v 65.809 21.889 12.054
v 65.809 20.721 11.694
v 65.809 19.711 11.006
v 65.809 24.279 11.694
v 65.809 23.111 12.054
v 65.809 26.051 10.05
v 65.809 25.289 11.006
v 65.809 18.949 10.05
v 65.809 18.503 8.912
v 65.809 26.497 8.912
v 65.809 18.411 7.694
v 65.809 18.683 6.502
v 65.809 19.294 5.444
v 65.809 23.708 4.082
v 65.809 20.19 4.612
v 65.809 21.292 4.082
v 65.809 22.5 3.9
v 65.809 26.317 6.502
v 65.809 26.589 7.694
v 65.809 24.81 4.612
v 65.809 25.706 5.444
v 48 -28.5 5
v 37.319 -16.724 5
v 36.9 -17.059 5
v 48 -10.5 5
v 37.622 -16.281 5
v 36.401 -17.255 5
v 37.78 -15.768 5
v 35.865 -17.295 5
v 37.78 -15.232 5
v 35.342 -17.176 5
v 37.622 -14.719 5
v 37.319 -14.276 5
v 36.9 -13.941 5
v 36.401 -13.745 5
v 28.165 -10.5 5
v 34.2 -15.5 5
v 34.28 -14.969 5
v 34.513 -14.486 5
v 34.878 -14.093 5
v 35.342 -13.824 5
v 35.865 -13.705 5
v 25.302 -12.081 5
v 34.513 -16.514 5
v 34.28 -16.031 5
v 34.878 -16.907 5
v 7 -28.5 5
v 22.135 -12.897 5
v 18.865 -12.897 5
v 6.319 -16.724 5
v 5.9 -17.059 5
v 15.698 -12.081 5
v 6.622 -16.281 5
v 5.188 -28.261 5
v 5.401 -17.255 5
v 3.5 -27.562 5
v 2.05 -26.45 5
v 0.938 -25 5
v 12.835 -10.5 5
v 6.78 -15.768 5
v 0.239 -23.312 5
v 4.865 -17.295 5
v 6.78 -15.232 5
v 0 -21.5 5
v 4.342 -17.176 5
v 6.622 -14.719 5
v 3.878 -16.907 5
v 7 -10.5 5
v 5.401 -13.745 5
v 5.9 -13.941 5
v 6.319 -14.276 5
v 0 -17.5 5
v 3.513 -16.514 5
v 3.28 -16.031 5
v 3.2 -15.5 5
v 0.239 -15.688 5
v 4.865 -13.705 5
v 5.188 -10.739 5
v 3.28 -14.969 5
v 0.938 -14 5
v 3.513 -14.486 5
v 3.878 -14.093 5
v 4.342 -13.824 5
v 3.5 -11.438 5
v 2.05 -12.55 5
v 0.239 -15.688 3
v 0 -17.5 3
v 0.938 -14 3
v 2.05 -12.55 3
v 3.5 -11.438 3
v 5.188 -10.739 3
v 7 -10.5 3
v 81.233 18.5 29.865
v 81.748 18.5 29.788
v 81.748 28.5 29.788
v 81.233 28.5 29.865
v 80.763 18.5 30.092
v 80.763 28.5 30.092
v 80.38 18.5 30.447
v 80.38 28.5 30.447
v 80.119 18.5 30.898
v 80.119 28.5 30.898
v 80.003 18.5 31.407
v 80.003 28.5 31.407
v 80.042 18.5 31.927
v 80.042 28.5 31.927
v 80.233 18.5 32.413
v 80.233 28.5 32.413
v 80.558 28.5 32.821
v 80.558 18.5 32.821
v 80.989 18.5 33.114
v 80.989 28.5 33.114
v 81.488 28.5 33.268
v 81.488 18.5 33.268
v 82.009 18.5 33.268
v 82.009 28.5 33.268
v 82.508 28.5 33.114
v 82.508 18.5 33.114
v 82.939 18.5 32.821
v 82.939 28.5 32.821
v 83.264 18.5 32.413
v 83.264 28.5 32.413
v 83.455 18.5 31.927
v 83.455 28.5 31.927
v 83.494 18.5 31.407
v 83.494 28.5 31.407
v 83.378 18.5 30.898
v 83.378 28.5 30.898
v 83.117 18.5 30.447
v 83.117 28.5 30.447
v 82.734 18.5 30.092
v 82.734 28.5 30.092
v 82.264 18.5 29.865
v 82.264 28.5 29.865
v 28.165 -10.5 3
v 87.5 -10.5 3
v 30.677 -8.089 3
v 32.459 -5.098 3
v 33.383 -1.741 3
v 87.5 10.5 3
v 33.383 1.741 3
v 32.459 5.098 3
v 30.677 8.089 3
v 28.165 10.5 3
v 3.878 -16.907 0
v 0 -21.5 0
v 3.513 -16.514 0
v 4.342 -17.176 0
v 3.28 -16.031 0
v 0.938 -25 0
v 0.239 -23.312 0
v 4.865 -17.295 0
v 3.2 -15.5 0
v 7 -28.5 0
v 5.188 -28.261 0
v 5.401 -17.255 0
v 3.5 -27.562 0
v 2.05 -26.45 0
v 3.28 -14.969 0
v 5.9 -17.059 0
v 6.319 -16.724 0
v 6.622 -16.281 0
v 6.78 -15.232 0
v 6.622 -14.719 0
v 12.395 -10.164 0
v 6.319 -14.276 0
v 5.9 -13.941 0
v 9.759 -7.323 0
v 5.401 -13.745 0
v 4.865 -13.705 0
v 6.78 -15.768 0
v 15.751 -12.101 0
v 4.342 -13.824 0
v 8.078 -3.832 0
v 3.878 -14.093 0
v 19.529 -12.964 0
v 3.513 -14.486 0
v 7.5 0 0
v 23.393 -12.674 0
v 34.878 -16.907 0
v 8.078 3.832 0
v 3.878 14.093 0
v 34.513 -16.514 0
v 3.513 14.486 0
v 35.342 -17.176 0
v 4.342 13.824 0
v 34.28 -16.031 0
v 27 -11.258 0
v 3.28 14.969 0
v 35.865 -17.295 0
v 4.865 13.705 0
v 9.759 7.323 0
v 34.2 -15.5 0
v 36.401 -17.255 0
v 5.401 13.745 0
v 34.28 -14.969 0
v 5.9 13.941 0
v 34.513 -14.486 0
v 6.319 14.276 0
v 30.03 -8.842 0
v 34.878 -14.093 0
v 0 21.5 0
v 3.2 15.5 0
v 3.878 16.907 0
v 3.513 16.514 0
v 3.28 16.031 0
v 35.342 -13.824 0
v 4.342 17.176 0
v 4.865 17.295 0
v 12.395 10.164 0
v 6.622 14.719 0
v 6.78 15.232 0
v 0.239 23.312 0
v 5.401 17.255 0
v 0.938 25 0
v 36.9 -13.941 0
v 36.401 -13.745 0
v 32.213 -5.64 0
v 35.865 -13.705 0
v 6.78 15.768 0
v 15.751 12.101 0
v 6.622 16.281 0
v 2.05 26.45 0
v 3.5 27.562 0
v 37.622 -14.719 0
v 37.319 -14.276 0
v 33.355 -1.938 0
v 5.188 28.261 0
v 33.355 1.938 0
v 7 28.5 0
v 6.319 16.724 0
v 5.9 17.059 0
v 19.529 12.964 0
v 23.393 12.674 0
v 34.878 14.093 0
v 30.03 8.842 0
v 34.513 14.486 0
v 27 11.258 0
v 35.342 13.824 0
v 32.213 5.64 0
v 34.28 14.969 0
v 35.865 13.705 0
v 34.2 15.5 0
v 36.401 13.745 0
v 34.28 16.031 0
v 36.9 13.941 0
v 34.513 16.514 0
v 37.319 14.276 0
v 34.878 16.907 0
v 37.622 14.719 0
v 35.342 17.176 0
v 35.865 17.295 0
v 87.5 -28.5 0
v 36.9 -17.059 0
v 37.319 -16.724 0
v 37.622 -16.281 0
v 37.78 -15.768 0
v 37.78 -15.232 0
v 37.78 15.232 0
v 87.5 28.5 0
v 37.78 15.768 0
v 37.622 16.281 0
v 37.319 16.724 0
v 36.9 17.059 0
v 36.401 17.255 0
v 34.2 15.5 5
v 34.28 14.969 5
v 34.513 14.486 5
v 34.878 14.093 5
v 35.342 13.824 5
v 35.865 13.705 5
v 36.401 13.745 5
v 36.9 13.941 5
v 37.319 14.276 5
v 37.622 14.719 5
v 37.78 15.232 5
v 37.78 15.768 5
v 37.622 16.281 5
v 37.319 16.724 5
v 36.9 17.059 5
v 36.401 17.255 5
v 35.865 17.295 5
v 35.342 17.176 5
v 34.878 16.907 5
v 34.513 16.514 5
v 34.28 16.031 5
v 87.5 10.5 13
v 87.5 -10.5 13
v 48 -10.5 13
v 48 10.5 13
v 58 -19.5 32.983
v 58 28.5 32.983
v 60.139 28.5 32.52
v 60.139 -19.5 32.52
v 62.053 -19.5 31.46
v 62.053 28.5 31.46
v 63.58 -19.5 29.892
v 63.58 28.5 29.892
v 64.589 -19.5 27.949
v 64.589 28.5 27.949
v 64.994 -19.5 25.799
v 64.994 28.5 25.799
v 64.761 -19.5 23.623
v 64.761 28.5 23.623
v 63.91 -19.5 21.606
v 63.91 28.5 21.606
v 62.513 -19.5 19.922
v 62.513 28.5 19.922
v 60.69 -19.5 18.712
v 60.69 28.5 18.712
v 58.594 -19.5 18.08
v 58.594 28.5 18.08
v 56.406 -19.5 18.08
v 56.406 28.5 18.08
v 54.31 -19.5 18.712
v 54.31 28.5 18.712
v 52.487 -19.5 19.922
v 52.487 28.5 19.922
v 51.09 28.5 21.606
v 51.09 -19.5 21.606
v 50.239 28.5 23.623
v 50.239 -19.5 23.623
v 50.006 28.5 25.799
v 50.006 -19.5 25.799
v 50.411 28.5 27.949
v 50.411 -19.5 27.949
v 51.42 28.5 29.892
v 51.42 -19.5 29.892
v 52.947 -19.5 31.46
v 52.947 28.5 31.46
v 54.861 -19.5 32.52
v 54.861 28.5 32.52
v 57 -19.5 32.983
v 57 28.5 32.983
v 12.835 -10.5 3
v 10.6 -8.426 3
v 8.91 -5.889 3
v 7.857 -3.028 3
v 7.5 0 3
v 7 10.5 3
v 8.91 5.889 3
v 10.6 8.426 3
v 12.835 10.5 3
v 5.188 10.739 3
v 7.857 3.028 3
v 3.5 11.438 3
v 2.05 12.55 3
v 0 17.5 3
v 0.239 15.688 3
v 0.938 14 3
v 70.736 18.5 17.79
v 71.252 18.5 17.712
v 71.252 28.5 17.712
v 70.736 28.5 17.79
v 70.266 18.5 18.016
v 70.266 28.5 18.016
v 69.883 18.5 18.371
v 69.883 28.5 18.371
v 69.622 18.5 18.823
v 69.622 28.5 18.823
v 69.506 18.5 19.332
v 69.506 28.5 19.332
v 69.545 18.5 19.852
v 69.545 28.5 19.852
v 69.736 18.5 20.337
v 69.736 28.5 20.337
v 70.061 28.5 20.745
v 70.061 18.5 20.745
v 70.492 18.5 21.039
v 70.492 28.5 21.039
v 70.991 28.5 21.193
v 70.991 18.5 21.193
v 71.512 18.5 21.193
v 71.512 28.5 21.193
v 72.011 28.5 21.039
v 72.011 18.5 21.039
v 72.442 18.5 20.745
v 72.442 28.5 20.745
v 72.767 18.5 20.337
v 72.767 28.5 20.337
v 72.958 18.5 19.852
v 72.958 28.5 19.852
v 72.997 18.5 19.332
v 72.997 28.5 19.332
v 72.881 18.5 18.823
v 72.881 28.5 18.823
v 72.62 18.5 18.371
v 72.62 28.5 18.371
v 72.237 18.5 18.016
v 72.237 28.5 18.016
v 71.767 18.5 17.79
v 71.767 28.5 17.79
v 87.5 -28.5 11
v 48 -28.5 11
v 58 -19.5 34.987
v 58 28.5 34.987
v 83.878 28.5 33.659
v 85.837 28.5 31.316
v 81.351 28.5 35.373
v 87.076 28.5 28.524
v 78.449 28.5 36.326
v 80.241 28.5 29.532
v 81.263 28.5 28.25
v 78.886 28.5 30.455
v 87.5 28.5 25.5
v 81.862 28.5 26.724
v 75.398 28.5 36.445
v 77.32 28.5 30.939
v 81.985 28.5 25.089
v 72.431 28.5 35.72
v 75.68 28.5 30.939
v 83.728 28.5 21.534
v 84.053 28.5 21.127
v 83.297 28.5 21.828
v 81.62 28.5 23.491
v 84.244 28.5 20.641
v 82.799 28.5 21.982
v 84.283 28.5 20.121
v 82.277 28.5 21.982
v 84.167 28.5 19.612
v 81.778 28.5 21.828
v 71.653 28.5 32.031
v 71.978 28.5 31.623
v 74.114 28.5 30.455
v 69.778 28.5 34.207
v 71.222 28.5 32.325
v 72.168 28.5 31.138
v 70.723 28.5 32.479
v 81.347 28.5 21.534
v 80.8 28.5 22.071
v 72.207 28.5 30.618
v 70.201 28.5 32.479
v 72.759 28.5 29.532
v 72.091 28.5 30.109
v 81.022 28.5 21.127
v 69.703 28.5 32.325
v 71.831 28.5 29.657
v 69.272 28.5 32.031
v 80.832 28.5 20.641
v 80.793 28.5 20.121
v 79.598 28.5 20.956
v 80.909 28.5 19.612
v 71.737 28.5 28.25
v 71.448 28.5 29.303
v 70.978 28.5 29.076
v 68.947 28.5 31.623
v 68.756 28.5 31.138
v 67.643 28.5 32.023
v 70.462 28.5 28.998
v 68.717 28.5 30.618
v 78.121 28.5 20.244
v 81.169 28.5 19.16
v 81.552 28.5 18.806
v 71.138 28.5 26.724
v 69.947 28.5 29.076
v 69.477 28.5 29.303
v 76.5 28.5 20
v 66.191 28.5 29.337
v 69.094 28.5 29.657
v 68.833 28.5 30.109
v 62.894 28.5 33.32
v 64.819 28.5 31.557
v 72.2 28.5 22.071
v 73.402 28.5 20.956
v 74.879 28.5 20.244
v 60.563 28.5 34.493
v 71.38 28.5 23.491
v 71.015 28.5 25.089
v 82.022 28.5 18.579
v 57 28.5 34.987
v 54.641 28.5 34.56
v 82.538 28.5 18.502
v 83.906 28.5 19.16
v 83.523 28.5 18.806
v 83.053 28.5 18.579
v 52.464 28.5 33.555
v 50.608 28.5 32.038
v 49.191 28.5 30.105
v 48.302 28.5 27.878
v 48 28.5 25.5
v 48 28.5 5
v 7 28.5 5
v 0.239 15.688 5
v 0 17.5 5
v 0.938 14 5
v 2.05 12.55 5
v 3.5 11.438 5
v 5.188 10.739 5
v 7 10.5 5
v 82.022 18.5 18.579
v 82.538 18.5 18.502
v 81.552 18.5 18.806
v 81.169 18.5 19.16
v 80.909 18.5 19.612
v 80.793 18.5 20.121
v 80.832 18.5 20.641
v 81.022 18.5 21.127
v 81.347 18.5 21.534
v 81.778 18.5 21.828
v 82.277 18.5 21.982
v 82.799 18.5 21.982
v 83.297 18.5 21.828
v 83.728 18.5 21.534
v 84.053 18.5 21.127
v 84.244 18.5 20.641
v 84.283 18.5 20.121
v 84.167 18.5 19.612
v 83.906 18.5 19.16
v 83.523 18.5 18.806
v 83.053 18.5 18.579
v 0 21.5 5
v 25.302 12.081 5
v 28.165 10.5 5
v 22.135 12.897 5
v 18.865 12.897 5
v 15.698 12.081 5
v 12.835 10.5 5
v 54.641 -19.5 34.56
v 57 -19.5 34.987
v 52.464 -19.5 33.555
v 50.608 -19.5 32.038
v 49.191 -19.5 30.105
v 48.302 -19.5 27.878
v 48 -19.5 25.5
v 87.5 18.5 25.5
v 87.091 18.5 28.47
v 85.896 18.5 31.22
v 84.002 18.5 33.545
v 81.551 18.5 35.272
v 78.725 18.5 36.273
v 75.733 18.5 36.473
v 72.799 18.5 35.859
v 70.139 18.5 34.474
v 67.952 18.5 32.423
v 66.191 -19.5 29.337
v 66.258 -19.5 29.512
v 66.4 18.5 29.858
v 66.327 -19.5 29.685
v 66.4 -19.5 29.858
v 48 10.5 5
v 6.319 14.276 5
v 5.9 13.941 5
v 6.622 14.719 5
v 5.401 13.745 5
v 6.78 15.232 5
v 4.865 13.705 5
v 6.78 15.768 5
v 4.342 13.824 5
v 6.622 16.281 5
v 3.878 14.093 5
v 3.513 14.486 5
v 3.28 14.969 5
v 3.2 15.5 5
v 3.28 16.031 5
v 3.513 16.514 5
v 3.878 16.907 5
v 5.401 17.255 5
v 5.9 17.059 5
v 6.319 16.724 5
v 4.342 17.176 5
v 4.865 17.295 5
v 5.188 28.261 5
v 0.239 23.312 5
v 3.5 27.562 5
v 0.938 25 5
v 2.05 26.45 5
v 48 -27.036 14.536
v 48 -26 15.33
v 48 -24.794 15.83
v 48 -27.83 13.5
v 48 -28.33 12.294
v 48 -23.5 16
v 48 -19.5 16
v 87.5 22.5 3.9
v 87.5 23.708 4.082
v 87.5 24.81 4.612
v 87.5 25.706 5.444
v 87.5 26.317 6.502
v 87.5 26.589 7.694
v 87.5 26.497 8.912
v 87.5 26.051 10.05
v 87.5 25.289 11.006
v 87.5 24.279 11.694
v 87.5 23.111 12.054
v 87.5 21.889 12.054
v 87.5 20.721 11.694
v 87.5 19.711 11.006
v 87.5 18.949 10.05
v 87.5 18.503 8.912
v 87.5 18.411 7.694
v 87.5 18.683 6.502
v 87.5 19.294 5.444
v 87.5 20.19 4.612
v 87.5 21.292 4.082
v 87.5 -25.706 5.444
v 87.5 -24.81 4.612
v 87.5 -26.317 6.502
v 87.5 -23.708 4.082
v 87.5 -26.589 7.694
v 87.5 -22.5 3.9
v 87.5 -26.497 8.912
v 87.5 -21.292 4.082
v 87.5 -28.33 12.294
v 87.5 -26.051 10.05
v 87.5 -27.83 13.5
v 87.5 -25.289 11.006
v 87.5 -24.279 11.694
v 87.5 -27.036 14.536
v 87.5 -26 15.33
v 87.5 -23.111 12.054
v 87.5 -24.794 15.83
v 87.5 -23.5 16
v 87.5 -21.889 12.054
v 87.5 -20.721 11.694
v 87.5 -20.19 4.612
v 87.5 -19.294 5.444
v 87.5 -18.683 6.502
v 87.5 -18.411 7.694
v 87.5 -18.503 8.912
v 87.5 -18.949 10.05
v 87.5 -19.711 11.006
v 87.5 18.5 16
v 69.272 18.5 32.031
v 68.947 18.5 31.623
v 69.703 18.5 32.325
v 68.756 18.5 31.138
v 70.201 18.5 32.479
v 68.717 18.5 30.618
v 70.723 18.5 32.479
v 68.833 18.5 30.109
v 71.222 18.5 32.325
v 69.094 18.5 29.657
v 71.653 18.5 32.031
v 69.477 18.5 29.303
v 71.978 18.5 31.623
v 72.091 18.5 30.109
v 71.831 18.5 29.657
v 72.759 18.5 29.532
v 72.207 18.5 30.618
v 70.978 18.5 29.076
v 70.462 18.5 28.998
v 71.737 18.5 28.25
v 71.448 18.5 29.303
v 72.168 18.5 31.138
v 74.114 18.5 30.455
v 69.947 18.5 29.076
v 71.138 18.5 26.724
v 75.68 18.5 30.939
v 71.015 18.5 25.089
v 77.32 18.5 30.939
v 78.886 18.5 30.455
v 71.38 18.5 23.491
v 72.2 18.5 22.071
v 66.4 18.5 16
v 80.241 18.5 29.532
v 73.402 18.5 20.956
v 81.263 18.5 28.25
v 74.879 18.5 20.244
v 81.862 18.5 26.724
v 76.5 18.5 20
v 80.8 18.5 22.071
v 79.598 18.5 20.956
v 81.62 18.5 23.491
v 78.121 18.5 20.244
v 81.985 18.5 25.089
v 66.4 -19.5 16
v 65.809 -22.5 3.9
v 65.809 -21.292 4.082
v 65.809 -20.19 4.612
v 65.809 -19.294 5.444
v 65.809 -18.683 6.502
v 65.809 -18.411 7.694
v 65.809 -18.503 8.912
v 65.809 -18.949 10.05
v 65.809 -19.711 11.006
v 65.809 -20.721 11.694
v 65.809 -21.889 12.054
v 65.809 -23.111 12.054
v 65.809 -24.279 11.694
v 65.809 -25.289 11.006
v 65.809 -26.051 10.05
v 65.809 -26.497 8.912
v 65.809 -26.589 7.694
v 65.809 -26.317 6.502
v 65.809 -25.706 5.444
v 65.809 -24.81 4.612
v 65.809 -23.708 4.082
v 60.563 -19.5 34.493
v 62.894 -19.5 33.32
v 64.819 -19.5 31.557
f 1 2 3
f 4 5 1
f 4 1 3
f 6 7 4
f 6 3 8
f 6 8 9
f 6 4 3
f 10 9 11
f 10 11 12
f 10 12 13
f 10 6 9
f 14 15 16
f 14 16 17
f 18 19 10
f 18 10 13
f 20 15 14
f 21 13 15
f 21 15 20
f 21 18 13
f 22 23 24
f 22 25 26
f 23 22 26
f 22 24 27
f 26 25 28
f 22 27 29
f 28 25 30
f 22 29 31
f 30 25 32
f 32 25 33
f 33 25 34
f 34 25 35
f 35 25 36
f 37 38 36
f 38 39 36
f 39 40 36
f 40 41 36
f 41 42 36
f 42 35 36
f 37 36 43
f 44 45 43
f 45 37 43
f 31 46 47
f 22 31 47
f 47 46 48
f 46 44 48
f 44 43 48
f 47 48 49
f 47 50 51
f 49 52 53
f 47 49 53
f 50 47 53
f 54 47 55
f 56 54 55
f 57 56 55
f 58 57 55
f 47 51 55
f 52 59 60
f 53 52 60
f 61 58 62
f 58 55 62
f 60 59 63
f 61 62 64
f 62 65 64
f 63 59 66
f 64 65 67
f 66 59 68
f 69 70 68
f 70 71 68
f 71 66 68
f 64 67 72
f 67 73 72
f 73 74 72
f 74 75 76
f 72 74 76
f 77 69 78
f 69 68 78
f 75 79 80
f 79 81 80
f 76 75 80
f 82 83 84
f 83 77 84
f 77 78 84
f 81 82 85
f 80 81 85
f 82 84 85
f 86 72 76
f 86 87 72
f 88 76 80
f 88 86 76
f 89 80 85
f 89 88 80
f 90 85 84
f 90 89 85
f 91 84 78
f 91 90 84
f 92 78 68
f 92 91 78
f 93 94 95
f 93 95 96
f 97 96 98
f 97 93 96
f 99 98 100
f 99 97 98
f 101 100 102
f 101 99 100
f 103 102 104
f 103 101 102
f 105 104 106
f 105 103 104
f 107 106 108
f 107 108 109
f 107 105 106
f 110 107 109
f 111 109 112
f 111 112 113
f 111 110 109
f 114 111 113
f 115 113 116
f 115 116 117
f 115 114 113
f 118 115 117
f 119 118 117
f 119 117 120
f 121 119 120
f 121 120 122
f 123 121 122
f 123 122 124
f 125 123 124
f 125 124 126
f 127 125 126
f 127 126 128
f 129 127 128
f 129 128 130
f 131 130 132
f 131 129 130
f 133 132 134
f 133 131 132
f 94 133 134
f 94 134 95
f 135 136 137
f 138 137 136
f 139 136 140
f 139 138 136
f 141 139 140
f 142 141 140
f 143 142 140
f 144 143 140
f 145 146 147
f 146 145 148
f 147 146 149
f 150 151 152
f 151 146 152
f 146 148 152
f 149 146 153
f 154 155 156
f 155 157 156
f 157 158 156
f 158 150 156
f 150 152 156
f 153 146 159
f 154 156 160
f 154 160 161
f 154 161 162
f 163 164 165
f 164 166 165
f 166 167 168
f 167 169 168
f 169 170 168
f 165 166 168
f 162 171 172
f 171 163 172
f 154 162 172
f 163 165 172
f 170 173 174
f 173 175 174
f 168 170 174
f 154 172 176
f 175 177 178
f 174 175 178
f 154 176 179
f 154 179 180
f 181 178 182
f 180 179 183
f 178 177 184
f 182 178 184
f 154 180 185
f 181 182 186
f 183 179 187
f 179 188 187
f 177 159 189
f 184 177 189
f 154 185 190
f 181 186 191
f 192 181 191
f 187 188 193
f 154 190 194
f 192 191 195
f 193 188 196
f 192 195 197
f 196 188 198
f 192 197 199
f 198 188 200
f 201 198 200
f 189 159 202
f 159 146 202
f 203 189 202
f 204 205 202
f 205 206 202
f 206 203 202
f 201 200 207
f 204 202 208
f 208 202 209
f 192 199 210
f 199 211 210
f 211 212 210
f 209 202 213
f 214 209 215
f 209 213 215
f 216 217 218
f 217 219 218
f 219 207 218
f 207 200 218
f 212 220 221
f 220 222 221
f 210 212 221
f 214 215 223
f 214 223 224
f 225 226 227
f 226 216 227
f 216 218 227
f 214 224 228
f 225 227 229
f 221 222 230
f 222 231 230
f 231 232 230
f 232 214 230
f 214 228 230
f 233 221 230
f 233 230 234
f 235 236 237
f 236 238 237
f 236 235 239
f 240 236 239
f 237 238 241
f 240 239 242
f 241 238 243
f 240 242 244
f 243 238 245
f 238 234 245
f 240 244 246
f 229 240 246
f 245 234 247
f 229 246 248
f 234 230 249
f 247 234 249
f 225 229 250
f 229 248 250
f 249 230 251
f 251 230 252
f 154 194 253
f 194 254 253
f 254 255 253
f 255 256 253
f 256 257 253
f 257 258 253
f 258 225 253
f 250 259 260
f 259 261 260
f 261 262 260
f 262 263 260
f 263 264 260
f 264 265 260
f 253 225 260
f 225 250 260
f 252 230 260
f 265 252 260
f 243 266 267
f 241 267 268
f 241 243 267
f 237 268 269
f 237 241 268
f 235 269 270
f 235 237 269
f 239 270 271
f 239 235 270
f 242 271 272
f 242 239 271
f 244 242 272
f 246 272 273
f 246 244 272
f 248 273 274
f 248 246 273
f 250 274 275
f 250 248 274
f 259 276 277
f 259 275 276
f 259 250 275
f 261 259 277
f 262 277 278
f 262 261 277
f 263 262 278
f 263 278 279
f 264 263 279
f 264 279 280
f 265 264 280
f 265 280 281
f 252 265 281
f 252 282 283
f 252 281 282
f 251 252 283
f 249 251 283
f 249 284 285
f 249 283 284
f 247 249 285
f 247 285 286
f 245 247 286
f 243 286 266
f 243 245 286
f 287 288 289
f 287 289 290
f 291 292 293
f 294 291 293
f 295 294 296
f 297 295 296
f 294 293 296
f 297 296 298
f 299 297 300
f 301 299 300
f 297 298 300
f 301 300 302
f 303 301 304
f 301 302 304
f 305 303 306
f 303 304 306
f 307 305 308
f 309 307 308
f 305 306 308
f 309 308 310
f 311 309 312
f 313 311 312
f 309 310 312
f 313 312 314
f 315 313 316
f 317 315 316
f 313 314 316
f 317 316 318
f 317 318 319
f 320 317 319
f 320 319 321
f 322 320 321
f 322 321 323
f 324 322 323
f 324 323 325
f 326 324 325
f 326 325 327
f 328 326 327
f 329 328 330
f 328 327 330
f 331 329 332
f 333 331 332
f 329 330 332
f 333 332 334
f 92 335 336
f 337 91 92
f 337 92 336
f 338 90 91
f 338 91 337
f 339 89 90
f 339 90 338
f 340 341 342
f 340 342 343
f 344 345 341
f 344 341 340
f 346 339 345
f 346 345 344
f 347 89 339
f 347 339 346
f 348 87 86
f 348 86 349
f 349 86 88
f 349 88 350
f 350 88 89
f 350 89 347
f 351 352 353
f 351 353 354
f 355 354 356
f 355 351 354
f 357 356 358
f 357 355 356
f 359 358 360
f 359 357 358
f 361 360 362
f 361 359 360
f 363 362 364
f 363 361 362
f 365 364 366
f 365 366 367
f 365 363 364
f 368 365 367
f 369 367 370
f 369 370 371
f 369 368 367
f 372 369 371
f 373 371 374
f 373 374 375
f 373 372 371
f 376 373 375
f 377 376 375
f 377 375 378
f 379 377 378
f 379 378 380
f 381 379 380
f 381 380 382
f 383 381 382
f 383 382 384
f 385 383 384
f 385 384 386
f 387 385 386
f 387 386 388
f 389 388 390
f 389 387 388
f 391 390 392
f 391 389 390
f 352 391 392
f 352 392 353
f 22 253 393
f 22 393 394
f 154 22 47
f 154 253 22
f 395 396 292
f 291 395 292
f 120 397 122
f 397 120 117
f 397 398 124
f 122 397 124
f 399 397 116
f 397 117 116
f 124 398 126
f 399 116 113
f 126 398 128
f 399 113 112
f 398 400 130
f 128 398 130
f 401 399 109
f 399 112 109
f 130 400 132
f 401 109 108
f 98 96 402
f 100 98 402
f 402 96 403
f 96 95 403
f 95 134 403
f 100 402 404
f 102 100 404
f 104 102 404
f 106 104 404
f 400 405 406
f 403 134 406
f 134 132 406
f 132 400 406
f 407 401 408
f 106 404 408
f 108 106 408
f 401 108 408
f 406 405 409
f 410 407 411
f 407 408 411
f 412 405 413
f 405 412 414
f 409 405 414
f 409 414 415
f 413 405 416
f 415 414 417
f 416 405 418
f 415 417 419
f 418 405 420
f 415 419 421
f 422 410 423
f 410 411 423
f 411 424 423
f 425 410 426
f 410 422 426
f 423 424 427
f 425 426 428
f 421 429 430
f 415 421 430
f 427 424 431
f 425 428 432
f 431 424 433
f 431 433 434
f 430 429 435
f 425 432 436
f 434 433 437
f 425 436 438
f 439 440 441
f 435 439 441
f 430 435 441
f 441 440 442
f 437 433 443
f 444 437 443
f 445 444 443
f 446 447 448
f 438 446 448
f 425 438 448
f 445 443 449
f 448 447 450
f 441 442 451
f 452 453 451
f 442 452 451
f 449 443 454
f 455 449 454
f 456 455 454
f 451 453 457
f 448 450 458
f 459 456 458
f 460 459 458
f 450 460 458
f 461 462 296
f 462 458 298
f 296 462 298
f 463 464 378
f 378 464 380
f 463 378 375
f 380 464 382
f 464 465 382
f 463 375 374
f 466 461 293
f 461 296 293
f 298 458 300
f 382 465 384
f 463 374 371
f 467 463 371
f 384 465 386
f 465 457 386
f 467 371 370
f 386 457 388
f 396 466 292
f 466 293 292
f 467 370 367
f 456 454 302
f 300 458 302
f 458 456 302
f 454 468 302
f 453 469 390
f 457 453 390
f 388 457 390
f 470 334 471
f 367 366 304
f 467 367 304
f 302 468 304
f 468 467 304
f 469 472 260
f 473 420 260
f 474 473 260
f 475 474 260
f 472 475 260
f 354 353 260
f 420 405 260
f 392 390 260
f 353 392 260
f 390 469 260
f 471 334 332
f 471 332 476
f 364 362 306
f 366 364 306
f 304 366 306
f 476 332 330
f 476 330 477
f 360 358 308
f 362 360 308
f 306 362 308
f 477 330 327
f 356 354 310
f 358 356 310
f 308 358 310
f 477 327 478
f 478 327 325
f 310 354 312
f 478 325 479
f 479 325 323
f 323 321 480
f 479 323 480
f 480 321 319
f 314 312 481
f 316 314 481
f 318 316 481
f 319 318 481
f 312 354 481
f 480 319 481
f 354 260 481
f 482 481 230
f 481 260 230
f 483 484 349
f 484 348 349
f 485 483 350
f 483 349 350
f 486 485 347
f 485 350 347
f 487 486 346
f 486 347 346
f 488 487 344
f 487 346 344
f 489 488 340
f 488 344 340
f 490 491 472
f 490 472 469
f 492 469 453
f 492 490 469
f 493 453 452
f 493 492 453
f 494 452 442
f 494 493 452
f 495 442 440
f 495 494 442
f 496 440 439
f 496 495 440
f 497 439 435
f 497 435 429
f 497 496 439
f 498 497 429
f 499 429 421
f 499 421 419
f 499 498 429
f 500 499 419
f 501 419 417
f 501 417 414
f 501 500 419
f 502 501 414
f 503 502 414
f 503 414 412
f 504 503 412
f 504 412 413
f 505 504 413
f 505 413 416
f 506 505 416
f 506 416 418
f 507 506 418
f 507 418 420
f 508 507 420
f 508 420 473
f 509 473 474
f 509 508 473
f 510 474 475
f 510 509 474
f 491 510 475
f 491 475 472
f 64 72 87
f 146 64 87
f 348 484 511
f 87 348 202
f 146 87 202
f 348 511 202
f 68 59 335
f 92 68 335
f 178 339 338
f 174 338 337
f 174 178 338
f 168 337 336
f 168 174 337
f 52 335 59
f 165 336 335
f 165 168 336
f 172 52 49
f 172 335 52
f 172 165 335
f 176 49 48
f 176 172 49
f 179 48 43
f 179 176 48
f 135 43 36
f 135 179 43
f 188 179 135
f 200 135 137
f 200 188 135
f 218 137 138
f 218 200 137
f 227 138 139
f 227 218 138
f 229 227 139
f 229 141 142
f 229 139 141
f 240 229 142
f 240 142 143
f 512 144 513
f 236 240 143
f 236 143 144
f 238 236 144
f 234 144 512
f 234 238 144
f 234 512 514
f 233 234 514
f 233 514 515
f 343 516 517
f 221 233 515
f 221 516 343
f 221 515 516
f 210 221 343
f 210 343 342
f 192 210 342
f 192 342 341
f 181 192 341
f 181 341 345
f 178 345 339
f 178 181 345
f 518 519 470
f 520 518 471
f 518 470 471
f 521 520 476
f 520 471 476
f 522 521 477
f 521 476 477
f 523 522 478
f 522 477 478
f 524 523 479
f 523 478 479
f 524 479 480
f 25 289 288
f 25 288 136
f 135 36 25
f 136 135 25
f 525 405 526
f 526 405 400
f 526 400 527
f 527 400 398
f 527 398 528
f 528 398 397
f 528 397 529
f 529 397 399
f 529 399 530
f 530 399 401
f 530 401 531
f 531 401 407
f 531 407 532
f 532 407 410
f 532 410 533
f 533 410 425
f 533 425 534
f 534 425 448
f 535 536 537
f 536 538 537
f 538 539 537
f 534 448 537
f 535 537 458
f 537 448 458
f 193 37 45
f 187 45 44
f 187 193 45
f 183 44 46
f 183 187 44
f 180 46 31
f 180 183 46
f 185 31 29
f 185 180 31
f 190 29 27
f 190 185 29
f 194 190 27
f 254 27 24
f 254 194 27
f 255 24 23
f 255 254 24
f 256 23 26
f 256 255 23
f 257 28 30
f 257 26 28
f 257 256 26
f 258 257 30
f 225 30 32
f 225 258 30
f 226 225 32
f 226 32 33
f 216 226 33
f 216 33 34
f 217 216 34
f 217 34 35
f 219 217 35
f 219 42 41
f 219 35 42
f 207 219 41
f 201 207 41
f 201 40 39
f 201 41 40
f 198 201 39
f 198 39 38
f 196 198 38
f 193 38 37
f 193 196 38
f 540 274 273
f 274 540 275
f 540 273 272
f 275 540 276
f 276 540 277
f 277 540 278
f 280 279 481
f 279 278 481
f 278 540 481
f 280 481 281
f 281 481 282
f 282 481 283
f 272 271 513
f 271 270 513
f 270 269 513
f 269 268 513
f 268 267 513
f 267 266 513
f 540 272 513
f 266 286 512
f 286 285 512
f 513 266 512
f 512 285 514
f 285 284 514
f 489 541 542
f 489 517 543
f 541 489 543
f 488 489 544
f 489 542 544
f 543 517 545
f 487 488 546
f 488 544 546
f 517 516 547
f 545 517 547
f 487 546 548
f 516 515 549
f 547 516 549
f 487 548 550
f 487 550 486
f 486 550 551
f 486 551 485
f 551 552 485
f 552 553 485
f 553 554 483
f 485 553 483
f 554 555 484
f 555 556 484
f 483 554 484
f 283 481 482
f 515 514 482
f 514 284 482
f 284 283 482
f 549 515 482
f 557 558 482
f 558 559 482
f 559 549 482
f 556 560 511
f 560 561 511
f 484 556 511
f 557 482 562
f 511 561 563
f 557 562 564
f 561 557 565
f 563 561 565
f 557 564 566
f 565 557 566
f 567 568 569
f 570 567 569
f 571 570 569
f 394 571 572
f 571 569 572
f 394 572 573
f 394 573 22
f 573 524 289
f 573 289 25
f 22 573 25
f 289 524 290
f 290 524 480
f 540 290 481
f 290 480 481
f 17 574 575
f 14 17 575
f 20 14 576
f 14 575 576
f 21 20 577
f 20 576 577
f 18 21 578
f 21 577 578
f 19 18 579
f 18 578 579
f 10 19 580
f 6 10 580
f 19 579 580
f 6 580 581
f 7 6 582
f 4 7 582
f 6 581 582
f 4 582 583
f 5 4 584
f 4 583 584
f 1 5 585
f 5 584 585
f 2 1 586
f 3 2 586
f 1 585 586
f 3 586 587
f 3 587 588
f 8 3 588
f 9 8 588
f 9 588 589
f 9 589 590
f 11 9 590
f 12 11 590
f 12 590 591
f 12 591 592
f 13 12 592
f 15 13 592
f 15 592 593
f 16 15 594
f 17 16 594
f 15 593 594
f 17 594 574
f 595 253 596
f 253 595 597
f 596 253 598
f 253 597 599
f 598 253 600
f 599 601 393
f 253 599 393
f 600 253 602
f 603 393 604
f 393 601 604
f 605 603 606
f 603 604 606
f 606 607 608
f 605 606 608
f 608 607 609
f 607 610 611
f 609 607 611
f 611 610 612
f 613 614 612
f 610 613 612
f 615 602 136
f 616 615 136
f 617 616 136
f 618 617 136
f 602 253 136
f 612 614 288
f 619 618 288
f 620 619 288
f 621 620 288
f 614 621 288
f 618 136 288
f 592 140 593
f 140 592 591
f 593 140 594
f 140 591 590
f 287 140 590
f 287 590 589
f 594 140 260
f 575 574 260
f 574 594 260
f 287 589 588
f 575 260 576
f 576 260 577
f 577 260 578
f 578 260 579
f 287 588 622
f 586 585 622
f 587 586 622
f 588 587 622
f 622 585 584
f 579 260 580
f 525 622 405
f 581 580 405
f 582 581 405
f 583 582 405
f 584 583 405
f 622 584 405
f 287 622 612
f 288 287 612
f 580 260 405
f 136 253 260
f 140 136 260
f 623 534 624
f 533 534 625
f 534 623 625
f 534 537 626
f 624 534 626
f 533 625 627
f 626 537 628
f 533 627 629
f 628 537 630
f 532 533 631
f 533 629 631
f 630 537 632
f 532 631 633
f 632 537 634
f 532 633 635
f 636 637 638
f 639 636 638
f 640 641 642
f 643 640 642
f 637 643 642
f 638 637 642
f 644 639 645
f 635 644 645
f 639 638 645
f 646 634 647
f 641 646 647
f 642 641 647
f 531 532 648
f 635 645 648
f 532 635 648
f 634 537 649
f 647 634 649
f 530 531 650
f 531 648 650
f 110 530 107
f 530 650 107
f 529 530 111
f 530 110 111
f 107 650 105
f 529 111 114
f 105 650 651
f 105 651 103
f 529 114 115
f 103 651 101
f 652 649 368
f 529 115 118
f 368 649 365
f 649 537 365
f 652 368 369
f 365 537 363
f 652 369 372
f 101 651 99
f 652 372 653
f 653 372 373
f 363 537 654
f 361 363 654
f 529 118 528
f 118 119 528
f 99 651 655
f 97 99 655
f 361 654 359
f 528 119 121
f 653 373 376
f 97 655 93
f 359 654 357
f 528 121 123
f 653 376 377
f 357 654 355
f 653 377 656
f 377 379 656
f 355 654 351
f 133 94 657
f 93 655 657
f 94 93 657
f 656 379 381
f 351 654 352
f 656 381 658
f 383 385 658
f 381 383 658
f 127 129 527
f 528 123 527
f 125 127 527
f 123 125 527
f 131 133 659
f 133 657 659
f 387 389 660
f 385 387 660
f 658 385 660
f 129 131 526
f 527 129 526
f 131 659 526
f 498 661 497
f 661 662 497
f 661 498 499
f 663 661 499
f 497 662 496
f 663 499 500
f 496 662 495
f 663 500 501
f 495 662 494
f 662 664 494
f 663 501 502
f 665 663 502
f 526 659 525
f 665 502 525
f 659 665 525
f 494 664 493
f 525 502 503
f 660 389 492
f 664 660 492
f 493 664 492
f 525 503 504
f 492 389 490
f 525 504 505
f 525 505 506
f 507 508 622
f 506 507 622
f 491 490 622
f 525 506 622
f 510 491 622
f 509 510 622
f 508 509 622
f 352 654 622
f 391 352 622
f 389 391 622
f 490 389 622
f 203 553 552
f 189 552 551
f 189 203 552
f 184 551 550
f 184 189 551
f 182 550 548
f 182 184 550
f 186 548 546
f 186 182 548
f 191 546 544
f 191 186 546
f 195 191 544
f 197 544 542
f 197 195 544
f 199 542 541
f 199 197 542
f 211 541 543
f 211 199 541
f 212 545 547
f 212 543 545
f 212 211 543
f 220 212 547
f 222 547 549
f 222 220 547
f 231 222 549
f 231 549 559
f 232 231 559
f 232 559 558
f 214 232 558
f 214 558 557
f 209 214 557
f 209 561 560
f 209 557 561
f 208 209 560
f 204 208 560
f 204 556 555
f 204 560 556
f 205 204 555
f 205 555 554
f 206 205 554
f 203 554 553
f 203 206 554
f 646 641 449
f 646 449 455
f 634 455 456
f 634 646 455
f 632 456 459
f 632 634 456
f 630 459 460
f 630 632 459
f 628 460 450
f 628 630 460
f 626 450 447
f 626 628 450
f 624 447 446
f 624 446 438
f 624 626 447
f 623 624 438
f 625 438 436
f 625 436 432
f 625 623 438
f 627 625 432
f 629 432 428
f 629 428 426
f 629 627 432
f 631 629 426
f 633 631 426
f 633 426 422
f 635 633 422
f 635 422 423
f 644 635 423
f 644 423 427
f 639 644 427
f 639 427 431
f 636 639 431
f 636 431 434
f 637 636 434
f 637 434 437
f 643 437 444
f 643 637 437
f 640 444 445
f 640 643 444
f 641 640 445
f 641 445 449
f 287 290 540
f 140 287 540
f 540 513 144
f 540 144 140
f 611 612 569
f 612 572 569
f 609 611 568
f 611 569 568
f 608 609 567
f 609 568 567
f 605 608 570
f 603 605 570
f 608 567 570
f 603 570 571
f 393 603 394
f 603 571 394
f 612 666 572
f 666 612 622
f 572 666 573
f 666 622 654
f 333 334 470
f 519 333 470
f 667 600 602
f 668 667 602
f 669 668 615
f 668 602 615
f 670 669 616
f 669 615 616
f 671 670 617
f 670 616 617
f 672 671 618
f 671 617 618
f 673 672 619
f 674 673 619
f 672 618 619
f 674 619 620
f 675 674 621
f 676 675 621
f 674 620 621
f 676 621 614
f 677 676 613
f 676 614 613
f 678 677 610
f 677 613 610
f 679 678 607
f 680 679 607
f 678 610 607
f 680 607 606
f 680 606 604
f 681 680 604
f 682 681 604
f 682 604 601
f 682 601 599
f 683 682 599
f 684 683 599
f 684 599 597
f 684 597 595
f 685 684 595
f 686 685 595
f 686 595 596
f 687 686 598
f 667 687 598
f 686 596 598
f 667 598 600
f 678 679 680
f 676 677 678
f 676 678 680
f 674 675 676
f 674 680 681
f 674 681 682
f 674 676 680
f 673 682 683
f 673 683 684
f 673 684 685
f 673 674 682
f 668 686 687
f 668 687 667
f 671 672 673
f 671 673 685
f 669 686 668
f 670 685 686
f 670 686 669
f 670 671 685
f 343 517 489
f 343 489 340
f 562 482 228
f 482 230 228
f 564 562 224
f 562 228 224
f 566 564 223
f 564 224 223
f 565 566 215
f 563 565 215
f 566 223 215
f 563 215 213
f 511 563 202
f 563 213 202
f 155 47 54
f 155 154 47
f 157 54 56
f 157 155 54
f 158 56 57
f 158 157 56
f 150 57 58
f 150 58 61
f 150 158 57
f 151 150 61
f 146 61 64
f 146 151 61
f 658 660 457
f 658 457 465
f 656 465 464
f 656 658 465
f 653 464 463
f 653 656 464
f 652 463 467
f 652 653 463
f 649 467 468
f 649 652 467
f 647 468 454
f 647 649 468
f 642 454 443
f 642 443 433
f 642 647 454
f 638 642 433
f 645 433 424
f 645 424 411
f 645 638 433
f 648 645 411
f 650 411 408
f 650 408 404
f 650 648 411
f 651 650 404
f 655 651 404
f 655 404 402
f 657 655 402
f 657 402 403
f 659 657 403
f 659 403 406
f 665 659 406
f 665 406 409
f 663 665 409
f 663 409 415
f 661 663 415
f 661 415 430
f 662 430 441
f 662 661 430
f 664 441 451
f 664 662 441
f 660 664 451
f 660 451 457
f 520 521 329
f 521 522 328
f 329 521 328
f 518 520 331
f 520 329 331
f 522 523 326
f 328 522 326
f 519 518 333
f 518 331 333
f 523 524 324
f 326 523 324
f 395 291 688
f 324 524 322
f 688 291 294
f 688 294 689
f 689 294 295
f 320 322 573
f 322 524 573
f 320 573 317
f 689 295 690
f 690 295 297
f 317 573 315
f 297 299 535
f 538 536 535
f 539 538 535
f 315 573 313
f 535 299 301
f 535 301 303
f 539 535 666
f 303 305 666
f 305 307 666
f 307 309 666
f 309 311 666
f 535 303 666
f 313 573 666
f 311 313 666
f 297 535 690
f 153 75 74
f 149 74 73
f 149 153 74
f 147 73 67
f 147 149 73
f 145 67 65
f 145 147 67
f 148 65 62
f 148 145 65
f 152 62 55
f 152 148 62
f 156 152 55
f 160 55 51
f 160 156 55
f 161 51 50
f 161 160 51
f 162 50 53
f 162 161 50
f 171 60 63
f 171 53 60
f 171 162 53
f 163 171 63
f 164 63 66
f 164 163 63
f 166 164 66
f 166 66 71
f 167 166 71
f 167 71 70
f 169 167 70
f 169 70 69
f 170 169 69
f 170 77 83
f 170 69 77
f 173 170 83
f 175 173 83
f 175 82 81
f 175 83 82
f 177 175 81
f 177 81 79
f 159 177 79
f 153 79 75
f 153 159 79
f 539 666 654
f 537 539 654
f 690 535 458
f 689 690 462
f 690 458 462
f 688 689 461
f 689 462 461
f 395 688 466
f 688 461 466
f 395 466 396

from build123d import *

# Parameters (mm, degrees)
SKETCH2_R             = 5.5
SKETCH2_R_2           = 1.75
BOSS_EXTRUDE1_DEPTH   = 28.5
CUT_EXTRUDE1_START    = 16
CUT_EXTRUDE1_DEPTH    = 83.998737366
SKETCH4_R             = 1.8
SKETCH4_R_2           = 13
HOLES_FOR_MOTOR_DEPTH = 99.998737366
SKETCH6_W             = 10
SKETCH6_H             = 21
CUT_EXTRUDE3_DEPTH    = 99.998737366
SKETCH11_R            = 4.1
CUT_EXTRUDE7_DEPTH    = 21.691
FILLET2_R             = 5
FILLET3_R             = 7


with BuildPart() as part:
    # Sketch2 → Boss-Extrude1 (new, symmetric)
    with BuildSketch(Plane(origin=(0, 0, 0), x_dir=(1, 0, 0), z_dir=(0, 1, 0))):
        with BuildLine():
            Line((58, -34.986832981), (58, -32.983314774))
            ThreePointArc((58, -32.983314774), (57.5, -18), (57, -32.983314774))
            Line((57, -32.983314774), (57, -34.986832981))
            ThreePointArc((57, -34.986832981), (50.607975624, -32.038348415), (48, -25.5))
            Line((48, -25.5), (48, -5))
            Line((48, -5), (0, -5))
            Line((0, -5), (0, 0))
            Line((0, 0), (87.5, 0))
            Line((87.5, 0), (87.5, -25.5))
            ThreePointArc((87.5, -25.5), (78.449190115, -36.325925267), (66.190789474, -29.336688458))
            ThreePointArc((66.190789474, -29.336688458), (62.894319797, -33.319930558), (58, -34.986832981))
        make_face()
        with Locations(Location((76.5, -25.5, 0), (0, 0, 90))):
            Circle(SKETCH2_R, mode=Mode.SUBTRACT)
        with Locations(Location((70.462323358, -30.748472232, 0), (0, 0, 90))):
            Circle(SKETCH2_R_2, mode=Mode.SUBTRACT)
        with Locations(Location((82.537676642, -20.251527768, 0), (0, 0, 90))):
            Circle(SKETCH2_R_2, mode=Mode.SUBTRACT)
        with Locations(Location((71.251527768, -19.462323358, 0), (0, 0, 90))):
            Circle(SKETCH2_R_2, mode=Mode.SUBTRACT)
        with Locations(Location((81.748472232, -31.537676642, 0), (0, 0, 90))):
            Circle(SKETCH2_R_2, mode=Mode.SUBTRACT)
    extrude(amount=BOSS_EXTRUDE1_DEPTH, both=True)

    # Sketch3 → Cut-Extrude1 (cut, through all)
    with BuildSketch(Plane.XY.offset(CUT_EXTRUDE1_START)):
        Polygon((66.4, 18.5), (88, 18.5), (88, -28.5), (48, -28.5), (48, -19.5), (66.4, -19.5), align=None)
    extrude(amount=CUT_EXTRUDE1_DEPTH, mode=Mode.SUBTRACT)

    # Sketch4 → Holes-for-motor (cut, through all)
    with BuildSketch(Plane.XY):
        with Locations(Location((5, 15.5, 0), (0, 0, 180))):
            Circle(SKETCH4_R)
        with Locations(Location((36, 15.5, 0), (0, 0, 180))):
            Circle(SKETCH4_R)
        with Locations(Location((5, -15.5, 0), (0, 0, 180))):
            Circle(SKETCH4_R)
        with Locations(Location((36, -15.5, 0), (0, 0, 180))):
            Circle(SKETCH4_R)
        with Locations(Location((20.5, 0, 0), (0, 0, 180))):
            Circle(SKETCH4_R_2)
    extrude(amount=HOLES_FOR_MOTOR_DEPTH, mode=Mode.SUBTRACT)

    # Sketch6 → Cut-Extrude3 (cut, through all)
    with BuildSketch(Plane(origin=(0, 0, 0), x_dir=(0, 0, -1), z_dir=(1, 0, 0))):
        with Locations((-8, 0)):
            Rectangle(SKETCH6_W, SKETCH6_H)
    extrude(amount=CUT_EXTRUDE3_DEPTH, mode=Mode.SUBTRACT)

    # Sketch11 → Cut-Extrude7 (cut)
    with BuildSketch(Plane(origin=(87.5, 0, 0), x_dir=(0, 0, -1), z_dir=(1, 0, 0))):
        with Locations((-8, -22.5)):
            Circle(SKETCH11_R)
        with Locations((-8, 22.5)):
            Circle(SKETCH11_R)
    extrude(amount=-CUT_EXTRUDE7_DEPTH, mode=Mode.SUBTRACT)

    # Fillet2
    fillet2_edges = [part.edges().sort_by_distance(p)[0] for p in [
        (67.75, -28.5, 16),
    ]]
    fillet(fillet2_edges, radius=FILLET2_R)

    # Fillet3
    fillet3_edges = [part.edges().sort_by_distance(p)[0] for p in [
        (0, -10.5, 4),
        (0, 10.5, 4),
        (0, -28.5, 2.5),
        (0, 28.5, 2.5),
    ]]
    fillet(fillet3_edges, radius=FILLET3_R)


solid = part.part
